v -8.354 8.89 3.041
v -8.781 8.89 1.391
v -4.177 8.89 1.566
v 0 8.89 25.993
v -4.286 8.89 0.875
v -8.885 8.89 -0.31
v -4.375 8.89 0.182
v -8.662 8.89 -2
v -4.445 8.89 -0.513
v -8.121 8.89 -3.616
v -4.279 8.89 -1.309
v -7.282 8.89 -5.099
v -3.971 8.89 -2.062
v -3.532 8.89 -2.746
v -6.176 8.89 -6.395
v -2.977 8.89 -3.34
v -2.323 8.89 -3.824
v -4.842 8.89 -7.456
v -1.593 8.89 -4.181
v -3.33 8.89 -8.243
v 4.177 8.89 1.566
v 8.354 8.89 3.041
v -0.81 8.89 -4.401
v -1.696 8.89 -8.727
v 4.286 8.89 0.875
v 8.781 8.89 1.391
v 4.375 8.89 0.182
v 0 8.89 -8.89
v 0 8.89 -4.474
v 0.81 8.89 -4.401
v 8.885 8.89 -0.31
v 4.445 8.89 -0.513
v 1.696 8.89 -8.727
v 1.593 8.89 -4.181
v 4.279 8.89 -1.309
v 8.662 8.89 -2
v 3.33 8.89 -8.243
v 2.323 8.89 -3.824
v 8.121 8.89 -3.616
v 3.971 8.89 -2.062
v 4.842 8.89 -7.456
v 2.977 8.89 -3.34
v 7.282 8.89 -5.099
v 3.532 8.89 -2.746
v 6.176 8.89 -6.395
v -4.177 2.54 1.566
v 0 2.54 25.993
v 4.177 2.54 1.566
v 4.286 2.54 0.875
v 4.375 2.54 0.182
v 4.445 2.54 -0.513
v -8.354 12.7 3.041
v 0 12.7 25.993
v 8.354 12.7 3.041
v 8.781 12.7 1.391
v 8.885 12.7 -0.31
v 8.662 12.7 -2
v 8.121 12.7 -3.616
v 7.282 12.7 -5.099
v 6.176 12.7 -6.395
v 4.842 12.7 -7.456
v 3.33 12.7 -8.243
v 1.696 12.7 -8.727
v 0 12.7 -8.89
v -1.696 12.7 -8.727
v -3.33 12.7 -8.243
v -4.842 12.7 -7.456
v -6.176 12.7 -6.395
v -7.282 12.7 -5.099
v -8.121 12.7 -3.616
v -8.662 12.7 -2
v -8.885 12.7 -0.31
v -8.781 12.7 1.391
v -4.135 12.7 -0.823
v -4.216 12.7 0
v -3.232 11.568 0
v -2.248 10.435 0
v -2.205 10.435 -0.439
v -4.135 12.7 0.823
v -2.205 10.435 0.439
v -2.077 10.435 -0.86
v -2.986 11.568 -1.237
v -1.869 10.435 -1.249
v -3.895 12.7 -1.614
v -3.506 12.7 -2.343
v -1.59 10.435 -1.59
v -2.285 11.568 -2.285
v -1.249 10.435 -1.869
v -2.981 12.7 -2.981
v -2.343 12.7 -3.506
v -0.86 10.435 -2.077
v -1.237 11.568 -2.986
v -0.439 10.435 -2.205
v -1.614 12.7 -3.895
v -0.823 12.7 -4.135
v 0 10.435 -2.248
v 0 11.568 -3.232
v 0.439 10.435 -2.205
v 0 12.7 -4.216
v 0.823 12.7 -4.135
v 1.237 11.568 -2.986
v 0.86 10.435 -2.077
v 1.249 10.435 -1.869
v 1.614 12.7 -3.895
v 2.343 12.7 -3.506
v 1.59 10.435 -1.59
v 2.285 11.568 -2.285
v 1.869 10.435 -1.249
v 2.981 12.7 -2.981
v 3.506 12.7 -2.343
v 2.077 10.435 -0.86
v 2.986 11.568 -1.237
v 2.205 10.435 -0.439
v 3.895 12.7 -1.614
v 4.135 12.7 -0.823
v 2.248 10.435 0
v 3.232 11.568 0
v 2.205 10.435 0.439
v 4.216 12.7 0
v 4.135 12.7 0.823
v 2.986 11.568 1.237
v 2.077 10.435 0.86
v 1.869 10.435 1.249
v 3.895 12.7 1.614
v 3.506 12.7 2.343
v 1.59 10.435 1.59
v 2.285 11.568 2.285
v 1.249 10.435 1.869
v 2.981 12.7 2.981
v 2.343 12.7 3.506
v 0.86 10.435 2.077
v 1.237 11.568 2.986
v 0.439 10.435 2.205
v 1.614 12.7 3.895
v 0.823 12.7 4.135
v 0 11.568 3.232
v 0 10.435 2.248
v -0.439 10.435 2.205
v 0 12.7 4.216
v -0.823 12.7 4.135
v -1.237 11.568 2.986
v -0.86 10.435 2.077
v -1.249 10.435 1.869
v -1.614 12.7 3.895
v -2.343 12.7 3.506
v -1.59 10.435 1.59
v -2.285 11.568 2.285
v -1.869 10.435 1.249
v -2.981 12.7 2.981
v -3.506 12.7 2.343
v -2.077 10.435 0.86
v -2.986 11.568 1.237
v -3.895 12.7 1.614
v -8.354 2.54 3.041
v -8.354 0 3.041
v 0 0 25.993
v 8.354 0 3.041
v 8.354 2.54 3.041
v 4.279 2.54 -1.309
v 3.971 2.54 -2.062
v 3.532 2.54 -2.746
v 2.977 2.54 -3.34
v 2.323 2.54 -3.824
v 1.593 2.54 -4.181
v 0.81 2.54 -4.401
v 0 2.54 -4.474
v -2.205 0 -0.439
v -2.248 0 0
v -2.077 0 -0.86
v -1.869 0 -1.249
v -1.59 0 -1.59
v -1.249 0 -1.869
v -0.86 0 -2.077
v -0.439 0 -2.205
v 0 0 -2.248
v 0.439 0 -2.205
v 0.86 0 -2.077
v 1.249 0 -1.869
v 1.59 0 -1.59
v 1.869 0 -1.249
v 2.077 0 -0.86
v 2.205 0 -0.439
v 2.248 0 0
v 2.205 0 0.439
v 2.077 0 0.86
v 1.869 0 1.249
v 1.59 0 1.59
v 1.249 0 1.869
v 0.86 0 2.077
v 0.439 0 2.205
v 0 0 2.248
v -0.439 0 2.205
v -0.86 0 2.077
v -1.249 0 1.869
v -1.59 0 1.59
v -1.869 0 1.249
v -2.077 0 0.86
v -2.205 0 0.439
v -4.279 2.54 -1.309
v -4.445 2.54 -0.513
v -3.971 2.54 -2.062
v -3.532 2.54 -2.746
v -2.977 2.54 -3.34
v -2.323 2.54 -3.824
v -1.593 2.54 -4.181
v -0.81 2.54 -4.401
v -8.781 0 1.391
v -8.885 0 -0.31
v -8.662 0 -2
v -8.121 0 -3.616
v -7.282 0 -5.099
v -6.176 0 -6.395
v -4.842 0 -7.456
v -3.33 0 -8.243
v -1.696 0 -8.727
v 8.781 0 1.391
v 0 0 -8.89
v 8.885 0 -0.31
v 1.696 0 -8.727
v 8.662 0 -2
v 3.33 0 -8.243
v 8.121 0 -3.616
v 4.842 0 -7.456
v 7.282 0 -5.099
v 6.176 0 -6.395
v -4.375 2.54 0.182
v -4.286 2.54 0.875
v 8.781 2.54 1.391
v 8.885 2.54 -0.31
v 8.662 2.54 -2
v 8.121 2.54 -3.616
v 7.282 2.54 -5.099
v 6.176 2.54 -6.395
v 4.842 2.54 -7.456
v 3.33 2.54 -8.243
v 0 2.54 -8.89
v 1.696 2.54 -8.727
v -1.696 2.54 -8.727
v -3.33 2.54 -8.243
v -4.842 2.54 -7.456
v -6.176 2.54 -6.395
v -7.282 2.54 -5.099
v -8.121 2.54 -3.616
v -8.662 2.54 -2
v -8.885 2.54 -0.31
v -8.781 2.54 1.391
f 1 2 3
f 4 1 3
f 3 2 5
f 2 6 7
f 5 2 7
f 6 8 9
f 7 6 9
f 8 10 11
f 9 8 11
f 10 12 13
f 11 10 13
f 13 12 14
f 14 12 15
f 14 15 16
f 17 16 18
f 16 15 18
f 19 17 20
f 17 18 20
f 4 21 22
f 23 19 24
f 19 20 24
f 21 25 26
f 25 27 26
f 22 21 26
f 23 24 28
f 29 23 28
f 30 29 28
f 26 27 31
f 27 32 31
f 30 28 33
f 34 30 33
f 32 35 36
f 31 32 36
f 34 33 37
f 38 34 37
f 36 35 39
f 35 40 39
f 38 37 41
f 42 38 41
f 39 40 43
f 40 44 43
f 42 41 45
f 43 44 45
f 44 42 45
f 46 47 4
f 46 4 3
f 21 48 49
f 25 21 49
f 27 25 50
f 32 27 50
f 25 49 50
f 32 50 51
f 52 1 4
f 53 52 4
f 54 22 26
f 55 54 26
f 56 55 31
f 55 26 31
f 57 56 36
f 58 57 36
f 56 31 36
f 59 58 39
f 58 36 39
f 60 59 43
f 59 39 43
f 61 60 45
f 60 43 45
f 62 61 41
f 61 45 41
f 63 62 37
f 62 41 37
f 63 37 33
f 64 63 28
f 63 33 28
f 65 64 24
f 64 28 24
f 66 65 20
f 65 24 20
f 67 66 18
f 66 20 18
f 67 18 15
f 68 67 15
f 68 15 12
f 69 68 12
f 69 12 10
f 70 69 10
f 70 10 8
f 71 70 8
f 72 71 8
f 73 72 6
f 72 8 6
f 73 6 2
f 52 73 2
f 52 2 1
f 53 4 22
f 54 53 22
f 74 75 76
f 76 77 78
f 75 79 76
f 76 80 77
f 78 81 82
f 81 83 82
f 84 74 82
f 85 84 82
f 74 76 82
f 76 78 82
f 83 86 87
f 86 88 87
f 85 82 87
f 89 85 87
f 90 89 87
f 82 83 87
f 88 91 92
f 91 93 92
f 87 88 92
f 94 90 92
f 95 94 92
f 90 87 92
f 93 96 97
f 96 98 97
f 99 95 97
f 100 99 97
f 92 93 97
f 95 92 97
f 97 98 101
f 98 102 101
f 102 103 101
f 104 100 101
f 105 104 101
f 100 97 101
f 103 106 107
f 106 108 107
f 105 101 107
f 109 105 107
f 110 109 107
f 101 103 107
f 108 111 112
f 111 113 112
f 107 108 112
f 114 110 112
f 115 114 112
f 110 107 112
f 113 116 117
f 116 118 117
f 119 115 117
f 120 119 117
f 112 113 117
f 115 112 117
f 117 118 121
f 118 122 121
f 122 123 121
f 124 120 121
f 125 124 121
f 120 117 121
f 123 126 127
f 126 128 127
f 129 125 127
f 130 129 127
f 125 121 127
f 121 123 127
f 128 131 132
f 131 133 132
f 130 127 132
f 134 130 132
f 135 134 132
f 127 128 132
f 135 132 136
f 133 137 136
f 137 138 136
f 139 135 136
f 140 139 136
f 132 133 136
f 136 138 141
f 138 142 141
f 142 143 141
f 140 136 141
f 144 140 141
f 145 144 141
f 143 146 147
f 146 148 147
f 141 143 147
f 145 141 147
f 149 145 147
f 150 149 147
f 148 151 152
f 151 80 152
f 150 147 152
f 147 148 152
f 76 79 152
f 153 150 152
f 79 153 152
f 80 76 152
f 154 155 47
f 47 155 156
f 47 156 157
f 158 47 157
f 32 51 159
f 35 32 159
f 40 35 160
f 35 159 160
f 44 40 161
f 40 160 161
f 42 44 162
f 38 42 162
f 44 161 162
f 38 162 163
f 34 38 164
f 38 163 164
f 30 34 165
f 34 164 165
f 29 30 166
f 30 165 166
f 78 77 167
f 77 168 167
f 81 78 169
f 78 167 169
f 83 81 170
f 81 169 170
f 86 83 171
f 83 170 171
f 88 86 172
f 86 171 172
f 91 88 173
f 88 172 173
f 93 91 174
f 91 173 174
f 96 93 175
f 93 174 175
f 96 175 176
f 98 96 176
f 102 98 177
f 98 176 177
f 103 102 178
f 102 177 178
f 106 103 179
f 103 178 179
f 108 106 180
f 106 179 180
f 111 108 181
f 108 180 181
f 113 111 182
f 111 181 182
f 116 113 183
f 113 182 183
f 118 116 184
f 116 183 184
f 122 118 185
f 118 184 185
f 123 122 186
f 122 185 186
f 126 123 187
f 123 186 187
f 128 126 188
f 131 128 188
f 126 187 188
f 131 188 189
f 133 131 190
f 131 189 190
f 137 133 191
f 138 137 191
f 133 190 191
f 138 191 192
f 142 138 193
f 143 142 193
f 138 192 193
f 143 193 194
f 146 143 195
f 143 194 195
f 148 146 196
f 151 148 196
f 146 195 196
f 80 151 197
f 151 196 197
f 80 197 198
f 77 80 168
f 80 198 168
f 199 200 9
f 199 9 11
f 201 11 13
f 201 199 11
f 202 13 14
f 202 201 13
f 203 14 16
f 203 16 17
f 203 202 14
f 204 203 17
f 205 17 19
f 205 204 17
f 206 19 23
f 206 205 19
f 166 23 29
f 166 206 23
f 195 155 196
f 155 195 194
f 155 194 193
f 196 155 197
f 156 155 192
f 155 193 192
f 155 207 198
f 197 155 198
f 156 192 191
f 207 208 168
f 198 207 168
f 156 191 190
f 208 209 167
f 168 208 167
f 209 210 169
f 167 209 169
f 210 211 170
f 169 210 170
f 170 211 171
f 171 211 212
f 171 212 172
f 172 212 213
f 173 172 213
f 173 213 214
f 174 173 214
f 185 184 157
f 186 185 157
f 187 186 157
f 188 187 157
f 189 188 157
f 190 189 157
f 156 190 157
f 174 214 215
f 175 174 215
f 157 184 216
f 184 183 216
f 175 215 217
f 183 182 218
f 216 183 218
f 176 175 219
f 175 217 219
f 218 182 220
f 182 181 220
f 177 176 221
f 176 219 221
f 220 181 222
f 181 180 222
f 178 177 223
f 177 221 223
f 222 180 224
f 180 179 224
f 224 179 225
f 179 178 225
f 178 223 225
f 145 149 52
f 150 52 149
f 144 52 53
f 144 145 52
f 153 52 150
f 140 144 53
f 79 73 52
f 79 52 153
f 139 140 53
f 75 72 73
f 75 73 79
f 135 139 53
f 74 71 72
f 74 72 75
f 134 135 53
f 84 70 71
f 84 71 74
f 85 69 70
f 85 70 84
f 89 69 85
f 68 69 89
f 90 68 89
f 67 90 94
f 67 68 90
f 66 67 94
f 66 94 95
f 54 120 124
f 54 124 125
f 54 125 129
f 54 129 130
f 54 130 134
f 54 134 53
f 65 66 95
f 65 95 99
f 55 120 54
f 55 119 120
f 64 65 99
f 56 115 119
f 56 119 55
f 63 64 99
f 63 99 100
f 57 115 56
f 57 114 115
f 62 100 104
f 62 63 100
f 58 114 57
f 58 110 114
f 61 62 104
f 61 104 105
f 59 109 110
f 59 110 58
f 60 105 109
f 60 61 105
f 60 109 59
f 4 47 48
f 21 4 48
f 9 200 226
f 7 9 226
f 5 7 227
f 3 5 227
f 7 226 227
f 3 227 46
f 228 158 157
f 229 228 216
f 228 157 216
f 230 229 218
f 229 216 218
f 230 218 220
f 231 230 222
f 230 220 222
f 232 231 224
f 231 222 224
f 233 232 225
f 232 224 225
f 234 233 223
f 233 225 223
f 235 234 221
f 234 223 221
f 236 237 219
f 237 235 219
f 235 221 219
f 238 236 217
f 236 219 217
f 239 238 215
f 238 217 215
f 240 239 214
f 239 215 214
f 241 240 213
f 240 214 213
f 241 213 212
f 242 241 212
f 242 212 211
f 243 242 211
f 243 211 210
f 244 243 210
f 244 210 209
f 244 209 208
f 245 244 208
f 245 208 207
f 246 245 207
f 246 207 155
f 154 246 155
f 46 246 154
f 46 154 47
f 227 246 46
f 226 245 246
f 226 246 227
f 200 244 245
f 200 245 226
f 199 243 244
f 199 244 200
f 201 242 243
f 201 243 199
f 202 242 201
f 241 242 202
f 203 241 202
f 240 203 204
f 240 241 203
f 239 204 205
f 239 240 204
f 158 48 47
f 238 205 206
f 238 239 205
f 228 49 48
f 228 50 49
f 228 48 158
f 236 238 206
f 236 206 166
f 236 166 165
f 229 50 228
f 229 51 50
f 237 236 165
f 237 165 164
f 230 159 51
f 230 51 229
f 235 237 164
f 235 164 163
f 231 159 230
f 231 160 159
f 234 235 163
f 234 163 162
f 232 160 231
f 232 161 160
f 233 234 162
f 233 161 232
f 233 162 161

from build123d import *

# Parameters (mm, degrees)
SKETCH1_R                                      = 8.89
BOSS_EXTRUDE1_DEPTH                            = 12.7
CUT_EXTRUDE2_START                             = -10.16
CUT_EXTRUDE2_DEPTH                             = 6.35
CSK_FOR_8_FLAT_HEAD_MACHINE_SCREW1_D           = 4.4958
CSK_FOR_8_FLAT_HEAD_MACHINE_SCREW1_CSINK_D     = 8.4328
CSK_FOR_8_FLAT_HEAD_MACHINE_SCREW1_CSINK_ANGLE = 82
FILLET1_R                                      = 25.4


with BuildPart() as part:
    # Sketch1 → Boss-Extrude1 (new body)
    with BuildSketch(Plane(origin=(0, 0, 0), x_dir=(1, 0, 0), z_dir=(0, 1, 0))):
        Circle(SKETCH1_R)
        with BuildLine():
            Line((0, -25.992621117), (8.353867399, -3.040559074))
            ThreePointArc((8.353867399, -3.040559074), (0, -8.89), (-8.353867399, -3.040559074))
            Line((-8.353867399, -3.040559074), (0, -25.992621117))
        make_face()
    extrude(amount=BOSS_EXTRUDE1_DEPTH)

    # Sketch5 → Cut-Extrude2 (cut)
    with BuildSketch(Plane(origin=(0, 12.7, 0), x_dir=(1, 0, 0), z_dir=(0, 1, 0)).offset(CUT_EXTRUDE2_START)):
        with BuildLine():
            Line((-4.445, 0), (-4.445, 0.512896595))
            ThreePointArc((-4.445, 0.512896595), (-2.977090499, 3.340362268), (0, 4.474493035))
            Line((0, 4.474493035), (0, 8.89))
            ThreePointArc((0, 8.89), (-7.282261674, 5.099094519), (-8.353867399, -3.040559074))
            Line((-8.353867399, -3.040559074), (0, -25.992621117))
            Line((0, -25.992621117), (-4.445, 0))
        make_face()
    cut_extrude2 = extrude(amount=CUT_EXTRUDE2_DEPTH, mode=Mode.SUBTRACT)

    # CSK for #8 Flat Head Machine Screw1 (through all)
    with Locations(Plane(origin=(0, 12.7, 0), x_dir=(1, 0, 0), z_dir=(0, 1, 0))):
        with Locations((0, 0)):
            CounterSinkHole(CSK_FOR_8_FLAT_HEAD_MACHINE_SCREW1_D / 2, CSK_FOR_8_FLAT_HEAD_MACHINE_SCREW1_CSINK_D / 2, counter_sink_angle=CSK_FOR_8_FLAT_HEAD_MACHINE_SCREW1_CSINK_ANGLE)

    # Mirror1: Cut-Extrude2 across plane
    add(cut_extrude2.mirror(Plane(origin=(0, 0, 0), x_dir=(0, 0, 1), z_dir=(1, 0, 0))), mode=Mode.SUBTRACT)

    # Fillet1
    # the kernel refuses this fillet: 25.4 mm, written as the material it takes off along each edge
    with BuildSketch(Plane(origin=(-4.445, 2.54, 0), x_dir=(0, 0, -1), z_dir=(0, 1, 0))) as fillet1_piece_1:
        with BuildLine():
            CenterArc((2.715876885, -25.30428576), FILLET1_R, 94.975600716, 4.728682493)
            Line((-1.565625003, -0.267737644), (-1.65125504, 0.232993318))
            Line((-1.65125504, 0.232993318), (-0.085630038, 0.500730962))
            Line((-0.085630038, 0.500730962), (0, 0.508))
            ThreePointArc((0, 0.508), (0.256448297, 0.508), (0.468836989, 0.506085715))
            Line((0.468836989, 0.506085715), (0.512896595, 0))
        make_face()
    extrude(amount=6.35, mode=Mode.SUBTRACT)
    with BuildSketch(Plane(origin=(4.445, 2.54, 0), x_dir=(-0.16856306644022723, 0, 0.9856908707258414), z_dir=(0, 1, 0))) as fillet1_piece_2:
        with BuildLine():
            CenterArc((1.58835295, -25.4), FILLET1_R, 90, 4.728682493)
            Line((-0.505557491, -0.086455423), (-0.5474357, 0.419815469))
            ThreePointArc((-0.5474357, 0.419815469), (-0.338408783, 0.457503251), (-0.085630038, 0.500730962))
            Line((-0.085630038, 0.500730962), (0, 0.508))
            Line((0, 0.508), (1.58835295, 0.508))
            Line((1.58835295, 0.508), (1.58835295, 0))
        make_face()
    extrude(amount=6.35, mode=Mode.SUBTRACT)


solid = part.part
